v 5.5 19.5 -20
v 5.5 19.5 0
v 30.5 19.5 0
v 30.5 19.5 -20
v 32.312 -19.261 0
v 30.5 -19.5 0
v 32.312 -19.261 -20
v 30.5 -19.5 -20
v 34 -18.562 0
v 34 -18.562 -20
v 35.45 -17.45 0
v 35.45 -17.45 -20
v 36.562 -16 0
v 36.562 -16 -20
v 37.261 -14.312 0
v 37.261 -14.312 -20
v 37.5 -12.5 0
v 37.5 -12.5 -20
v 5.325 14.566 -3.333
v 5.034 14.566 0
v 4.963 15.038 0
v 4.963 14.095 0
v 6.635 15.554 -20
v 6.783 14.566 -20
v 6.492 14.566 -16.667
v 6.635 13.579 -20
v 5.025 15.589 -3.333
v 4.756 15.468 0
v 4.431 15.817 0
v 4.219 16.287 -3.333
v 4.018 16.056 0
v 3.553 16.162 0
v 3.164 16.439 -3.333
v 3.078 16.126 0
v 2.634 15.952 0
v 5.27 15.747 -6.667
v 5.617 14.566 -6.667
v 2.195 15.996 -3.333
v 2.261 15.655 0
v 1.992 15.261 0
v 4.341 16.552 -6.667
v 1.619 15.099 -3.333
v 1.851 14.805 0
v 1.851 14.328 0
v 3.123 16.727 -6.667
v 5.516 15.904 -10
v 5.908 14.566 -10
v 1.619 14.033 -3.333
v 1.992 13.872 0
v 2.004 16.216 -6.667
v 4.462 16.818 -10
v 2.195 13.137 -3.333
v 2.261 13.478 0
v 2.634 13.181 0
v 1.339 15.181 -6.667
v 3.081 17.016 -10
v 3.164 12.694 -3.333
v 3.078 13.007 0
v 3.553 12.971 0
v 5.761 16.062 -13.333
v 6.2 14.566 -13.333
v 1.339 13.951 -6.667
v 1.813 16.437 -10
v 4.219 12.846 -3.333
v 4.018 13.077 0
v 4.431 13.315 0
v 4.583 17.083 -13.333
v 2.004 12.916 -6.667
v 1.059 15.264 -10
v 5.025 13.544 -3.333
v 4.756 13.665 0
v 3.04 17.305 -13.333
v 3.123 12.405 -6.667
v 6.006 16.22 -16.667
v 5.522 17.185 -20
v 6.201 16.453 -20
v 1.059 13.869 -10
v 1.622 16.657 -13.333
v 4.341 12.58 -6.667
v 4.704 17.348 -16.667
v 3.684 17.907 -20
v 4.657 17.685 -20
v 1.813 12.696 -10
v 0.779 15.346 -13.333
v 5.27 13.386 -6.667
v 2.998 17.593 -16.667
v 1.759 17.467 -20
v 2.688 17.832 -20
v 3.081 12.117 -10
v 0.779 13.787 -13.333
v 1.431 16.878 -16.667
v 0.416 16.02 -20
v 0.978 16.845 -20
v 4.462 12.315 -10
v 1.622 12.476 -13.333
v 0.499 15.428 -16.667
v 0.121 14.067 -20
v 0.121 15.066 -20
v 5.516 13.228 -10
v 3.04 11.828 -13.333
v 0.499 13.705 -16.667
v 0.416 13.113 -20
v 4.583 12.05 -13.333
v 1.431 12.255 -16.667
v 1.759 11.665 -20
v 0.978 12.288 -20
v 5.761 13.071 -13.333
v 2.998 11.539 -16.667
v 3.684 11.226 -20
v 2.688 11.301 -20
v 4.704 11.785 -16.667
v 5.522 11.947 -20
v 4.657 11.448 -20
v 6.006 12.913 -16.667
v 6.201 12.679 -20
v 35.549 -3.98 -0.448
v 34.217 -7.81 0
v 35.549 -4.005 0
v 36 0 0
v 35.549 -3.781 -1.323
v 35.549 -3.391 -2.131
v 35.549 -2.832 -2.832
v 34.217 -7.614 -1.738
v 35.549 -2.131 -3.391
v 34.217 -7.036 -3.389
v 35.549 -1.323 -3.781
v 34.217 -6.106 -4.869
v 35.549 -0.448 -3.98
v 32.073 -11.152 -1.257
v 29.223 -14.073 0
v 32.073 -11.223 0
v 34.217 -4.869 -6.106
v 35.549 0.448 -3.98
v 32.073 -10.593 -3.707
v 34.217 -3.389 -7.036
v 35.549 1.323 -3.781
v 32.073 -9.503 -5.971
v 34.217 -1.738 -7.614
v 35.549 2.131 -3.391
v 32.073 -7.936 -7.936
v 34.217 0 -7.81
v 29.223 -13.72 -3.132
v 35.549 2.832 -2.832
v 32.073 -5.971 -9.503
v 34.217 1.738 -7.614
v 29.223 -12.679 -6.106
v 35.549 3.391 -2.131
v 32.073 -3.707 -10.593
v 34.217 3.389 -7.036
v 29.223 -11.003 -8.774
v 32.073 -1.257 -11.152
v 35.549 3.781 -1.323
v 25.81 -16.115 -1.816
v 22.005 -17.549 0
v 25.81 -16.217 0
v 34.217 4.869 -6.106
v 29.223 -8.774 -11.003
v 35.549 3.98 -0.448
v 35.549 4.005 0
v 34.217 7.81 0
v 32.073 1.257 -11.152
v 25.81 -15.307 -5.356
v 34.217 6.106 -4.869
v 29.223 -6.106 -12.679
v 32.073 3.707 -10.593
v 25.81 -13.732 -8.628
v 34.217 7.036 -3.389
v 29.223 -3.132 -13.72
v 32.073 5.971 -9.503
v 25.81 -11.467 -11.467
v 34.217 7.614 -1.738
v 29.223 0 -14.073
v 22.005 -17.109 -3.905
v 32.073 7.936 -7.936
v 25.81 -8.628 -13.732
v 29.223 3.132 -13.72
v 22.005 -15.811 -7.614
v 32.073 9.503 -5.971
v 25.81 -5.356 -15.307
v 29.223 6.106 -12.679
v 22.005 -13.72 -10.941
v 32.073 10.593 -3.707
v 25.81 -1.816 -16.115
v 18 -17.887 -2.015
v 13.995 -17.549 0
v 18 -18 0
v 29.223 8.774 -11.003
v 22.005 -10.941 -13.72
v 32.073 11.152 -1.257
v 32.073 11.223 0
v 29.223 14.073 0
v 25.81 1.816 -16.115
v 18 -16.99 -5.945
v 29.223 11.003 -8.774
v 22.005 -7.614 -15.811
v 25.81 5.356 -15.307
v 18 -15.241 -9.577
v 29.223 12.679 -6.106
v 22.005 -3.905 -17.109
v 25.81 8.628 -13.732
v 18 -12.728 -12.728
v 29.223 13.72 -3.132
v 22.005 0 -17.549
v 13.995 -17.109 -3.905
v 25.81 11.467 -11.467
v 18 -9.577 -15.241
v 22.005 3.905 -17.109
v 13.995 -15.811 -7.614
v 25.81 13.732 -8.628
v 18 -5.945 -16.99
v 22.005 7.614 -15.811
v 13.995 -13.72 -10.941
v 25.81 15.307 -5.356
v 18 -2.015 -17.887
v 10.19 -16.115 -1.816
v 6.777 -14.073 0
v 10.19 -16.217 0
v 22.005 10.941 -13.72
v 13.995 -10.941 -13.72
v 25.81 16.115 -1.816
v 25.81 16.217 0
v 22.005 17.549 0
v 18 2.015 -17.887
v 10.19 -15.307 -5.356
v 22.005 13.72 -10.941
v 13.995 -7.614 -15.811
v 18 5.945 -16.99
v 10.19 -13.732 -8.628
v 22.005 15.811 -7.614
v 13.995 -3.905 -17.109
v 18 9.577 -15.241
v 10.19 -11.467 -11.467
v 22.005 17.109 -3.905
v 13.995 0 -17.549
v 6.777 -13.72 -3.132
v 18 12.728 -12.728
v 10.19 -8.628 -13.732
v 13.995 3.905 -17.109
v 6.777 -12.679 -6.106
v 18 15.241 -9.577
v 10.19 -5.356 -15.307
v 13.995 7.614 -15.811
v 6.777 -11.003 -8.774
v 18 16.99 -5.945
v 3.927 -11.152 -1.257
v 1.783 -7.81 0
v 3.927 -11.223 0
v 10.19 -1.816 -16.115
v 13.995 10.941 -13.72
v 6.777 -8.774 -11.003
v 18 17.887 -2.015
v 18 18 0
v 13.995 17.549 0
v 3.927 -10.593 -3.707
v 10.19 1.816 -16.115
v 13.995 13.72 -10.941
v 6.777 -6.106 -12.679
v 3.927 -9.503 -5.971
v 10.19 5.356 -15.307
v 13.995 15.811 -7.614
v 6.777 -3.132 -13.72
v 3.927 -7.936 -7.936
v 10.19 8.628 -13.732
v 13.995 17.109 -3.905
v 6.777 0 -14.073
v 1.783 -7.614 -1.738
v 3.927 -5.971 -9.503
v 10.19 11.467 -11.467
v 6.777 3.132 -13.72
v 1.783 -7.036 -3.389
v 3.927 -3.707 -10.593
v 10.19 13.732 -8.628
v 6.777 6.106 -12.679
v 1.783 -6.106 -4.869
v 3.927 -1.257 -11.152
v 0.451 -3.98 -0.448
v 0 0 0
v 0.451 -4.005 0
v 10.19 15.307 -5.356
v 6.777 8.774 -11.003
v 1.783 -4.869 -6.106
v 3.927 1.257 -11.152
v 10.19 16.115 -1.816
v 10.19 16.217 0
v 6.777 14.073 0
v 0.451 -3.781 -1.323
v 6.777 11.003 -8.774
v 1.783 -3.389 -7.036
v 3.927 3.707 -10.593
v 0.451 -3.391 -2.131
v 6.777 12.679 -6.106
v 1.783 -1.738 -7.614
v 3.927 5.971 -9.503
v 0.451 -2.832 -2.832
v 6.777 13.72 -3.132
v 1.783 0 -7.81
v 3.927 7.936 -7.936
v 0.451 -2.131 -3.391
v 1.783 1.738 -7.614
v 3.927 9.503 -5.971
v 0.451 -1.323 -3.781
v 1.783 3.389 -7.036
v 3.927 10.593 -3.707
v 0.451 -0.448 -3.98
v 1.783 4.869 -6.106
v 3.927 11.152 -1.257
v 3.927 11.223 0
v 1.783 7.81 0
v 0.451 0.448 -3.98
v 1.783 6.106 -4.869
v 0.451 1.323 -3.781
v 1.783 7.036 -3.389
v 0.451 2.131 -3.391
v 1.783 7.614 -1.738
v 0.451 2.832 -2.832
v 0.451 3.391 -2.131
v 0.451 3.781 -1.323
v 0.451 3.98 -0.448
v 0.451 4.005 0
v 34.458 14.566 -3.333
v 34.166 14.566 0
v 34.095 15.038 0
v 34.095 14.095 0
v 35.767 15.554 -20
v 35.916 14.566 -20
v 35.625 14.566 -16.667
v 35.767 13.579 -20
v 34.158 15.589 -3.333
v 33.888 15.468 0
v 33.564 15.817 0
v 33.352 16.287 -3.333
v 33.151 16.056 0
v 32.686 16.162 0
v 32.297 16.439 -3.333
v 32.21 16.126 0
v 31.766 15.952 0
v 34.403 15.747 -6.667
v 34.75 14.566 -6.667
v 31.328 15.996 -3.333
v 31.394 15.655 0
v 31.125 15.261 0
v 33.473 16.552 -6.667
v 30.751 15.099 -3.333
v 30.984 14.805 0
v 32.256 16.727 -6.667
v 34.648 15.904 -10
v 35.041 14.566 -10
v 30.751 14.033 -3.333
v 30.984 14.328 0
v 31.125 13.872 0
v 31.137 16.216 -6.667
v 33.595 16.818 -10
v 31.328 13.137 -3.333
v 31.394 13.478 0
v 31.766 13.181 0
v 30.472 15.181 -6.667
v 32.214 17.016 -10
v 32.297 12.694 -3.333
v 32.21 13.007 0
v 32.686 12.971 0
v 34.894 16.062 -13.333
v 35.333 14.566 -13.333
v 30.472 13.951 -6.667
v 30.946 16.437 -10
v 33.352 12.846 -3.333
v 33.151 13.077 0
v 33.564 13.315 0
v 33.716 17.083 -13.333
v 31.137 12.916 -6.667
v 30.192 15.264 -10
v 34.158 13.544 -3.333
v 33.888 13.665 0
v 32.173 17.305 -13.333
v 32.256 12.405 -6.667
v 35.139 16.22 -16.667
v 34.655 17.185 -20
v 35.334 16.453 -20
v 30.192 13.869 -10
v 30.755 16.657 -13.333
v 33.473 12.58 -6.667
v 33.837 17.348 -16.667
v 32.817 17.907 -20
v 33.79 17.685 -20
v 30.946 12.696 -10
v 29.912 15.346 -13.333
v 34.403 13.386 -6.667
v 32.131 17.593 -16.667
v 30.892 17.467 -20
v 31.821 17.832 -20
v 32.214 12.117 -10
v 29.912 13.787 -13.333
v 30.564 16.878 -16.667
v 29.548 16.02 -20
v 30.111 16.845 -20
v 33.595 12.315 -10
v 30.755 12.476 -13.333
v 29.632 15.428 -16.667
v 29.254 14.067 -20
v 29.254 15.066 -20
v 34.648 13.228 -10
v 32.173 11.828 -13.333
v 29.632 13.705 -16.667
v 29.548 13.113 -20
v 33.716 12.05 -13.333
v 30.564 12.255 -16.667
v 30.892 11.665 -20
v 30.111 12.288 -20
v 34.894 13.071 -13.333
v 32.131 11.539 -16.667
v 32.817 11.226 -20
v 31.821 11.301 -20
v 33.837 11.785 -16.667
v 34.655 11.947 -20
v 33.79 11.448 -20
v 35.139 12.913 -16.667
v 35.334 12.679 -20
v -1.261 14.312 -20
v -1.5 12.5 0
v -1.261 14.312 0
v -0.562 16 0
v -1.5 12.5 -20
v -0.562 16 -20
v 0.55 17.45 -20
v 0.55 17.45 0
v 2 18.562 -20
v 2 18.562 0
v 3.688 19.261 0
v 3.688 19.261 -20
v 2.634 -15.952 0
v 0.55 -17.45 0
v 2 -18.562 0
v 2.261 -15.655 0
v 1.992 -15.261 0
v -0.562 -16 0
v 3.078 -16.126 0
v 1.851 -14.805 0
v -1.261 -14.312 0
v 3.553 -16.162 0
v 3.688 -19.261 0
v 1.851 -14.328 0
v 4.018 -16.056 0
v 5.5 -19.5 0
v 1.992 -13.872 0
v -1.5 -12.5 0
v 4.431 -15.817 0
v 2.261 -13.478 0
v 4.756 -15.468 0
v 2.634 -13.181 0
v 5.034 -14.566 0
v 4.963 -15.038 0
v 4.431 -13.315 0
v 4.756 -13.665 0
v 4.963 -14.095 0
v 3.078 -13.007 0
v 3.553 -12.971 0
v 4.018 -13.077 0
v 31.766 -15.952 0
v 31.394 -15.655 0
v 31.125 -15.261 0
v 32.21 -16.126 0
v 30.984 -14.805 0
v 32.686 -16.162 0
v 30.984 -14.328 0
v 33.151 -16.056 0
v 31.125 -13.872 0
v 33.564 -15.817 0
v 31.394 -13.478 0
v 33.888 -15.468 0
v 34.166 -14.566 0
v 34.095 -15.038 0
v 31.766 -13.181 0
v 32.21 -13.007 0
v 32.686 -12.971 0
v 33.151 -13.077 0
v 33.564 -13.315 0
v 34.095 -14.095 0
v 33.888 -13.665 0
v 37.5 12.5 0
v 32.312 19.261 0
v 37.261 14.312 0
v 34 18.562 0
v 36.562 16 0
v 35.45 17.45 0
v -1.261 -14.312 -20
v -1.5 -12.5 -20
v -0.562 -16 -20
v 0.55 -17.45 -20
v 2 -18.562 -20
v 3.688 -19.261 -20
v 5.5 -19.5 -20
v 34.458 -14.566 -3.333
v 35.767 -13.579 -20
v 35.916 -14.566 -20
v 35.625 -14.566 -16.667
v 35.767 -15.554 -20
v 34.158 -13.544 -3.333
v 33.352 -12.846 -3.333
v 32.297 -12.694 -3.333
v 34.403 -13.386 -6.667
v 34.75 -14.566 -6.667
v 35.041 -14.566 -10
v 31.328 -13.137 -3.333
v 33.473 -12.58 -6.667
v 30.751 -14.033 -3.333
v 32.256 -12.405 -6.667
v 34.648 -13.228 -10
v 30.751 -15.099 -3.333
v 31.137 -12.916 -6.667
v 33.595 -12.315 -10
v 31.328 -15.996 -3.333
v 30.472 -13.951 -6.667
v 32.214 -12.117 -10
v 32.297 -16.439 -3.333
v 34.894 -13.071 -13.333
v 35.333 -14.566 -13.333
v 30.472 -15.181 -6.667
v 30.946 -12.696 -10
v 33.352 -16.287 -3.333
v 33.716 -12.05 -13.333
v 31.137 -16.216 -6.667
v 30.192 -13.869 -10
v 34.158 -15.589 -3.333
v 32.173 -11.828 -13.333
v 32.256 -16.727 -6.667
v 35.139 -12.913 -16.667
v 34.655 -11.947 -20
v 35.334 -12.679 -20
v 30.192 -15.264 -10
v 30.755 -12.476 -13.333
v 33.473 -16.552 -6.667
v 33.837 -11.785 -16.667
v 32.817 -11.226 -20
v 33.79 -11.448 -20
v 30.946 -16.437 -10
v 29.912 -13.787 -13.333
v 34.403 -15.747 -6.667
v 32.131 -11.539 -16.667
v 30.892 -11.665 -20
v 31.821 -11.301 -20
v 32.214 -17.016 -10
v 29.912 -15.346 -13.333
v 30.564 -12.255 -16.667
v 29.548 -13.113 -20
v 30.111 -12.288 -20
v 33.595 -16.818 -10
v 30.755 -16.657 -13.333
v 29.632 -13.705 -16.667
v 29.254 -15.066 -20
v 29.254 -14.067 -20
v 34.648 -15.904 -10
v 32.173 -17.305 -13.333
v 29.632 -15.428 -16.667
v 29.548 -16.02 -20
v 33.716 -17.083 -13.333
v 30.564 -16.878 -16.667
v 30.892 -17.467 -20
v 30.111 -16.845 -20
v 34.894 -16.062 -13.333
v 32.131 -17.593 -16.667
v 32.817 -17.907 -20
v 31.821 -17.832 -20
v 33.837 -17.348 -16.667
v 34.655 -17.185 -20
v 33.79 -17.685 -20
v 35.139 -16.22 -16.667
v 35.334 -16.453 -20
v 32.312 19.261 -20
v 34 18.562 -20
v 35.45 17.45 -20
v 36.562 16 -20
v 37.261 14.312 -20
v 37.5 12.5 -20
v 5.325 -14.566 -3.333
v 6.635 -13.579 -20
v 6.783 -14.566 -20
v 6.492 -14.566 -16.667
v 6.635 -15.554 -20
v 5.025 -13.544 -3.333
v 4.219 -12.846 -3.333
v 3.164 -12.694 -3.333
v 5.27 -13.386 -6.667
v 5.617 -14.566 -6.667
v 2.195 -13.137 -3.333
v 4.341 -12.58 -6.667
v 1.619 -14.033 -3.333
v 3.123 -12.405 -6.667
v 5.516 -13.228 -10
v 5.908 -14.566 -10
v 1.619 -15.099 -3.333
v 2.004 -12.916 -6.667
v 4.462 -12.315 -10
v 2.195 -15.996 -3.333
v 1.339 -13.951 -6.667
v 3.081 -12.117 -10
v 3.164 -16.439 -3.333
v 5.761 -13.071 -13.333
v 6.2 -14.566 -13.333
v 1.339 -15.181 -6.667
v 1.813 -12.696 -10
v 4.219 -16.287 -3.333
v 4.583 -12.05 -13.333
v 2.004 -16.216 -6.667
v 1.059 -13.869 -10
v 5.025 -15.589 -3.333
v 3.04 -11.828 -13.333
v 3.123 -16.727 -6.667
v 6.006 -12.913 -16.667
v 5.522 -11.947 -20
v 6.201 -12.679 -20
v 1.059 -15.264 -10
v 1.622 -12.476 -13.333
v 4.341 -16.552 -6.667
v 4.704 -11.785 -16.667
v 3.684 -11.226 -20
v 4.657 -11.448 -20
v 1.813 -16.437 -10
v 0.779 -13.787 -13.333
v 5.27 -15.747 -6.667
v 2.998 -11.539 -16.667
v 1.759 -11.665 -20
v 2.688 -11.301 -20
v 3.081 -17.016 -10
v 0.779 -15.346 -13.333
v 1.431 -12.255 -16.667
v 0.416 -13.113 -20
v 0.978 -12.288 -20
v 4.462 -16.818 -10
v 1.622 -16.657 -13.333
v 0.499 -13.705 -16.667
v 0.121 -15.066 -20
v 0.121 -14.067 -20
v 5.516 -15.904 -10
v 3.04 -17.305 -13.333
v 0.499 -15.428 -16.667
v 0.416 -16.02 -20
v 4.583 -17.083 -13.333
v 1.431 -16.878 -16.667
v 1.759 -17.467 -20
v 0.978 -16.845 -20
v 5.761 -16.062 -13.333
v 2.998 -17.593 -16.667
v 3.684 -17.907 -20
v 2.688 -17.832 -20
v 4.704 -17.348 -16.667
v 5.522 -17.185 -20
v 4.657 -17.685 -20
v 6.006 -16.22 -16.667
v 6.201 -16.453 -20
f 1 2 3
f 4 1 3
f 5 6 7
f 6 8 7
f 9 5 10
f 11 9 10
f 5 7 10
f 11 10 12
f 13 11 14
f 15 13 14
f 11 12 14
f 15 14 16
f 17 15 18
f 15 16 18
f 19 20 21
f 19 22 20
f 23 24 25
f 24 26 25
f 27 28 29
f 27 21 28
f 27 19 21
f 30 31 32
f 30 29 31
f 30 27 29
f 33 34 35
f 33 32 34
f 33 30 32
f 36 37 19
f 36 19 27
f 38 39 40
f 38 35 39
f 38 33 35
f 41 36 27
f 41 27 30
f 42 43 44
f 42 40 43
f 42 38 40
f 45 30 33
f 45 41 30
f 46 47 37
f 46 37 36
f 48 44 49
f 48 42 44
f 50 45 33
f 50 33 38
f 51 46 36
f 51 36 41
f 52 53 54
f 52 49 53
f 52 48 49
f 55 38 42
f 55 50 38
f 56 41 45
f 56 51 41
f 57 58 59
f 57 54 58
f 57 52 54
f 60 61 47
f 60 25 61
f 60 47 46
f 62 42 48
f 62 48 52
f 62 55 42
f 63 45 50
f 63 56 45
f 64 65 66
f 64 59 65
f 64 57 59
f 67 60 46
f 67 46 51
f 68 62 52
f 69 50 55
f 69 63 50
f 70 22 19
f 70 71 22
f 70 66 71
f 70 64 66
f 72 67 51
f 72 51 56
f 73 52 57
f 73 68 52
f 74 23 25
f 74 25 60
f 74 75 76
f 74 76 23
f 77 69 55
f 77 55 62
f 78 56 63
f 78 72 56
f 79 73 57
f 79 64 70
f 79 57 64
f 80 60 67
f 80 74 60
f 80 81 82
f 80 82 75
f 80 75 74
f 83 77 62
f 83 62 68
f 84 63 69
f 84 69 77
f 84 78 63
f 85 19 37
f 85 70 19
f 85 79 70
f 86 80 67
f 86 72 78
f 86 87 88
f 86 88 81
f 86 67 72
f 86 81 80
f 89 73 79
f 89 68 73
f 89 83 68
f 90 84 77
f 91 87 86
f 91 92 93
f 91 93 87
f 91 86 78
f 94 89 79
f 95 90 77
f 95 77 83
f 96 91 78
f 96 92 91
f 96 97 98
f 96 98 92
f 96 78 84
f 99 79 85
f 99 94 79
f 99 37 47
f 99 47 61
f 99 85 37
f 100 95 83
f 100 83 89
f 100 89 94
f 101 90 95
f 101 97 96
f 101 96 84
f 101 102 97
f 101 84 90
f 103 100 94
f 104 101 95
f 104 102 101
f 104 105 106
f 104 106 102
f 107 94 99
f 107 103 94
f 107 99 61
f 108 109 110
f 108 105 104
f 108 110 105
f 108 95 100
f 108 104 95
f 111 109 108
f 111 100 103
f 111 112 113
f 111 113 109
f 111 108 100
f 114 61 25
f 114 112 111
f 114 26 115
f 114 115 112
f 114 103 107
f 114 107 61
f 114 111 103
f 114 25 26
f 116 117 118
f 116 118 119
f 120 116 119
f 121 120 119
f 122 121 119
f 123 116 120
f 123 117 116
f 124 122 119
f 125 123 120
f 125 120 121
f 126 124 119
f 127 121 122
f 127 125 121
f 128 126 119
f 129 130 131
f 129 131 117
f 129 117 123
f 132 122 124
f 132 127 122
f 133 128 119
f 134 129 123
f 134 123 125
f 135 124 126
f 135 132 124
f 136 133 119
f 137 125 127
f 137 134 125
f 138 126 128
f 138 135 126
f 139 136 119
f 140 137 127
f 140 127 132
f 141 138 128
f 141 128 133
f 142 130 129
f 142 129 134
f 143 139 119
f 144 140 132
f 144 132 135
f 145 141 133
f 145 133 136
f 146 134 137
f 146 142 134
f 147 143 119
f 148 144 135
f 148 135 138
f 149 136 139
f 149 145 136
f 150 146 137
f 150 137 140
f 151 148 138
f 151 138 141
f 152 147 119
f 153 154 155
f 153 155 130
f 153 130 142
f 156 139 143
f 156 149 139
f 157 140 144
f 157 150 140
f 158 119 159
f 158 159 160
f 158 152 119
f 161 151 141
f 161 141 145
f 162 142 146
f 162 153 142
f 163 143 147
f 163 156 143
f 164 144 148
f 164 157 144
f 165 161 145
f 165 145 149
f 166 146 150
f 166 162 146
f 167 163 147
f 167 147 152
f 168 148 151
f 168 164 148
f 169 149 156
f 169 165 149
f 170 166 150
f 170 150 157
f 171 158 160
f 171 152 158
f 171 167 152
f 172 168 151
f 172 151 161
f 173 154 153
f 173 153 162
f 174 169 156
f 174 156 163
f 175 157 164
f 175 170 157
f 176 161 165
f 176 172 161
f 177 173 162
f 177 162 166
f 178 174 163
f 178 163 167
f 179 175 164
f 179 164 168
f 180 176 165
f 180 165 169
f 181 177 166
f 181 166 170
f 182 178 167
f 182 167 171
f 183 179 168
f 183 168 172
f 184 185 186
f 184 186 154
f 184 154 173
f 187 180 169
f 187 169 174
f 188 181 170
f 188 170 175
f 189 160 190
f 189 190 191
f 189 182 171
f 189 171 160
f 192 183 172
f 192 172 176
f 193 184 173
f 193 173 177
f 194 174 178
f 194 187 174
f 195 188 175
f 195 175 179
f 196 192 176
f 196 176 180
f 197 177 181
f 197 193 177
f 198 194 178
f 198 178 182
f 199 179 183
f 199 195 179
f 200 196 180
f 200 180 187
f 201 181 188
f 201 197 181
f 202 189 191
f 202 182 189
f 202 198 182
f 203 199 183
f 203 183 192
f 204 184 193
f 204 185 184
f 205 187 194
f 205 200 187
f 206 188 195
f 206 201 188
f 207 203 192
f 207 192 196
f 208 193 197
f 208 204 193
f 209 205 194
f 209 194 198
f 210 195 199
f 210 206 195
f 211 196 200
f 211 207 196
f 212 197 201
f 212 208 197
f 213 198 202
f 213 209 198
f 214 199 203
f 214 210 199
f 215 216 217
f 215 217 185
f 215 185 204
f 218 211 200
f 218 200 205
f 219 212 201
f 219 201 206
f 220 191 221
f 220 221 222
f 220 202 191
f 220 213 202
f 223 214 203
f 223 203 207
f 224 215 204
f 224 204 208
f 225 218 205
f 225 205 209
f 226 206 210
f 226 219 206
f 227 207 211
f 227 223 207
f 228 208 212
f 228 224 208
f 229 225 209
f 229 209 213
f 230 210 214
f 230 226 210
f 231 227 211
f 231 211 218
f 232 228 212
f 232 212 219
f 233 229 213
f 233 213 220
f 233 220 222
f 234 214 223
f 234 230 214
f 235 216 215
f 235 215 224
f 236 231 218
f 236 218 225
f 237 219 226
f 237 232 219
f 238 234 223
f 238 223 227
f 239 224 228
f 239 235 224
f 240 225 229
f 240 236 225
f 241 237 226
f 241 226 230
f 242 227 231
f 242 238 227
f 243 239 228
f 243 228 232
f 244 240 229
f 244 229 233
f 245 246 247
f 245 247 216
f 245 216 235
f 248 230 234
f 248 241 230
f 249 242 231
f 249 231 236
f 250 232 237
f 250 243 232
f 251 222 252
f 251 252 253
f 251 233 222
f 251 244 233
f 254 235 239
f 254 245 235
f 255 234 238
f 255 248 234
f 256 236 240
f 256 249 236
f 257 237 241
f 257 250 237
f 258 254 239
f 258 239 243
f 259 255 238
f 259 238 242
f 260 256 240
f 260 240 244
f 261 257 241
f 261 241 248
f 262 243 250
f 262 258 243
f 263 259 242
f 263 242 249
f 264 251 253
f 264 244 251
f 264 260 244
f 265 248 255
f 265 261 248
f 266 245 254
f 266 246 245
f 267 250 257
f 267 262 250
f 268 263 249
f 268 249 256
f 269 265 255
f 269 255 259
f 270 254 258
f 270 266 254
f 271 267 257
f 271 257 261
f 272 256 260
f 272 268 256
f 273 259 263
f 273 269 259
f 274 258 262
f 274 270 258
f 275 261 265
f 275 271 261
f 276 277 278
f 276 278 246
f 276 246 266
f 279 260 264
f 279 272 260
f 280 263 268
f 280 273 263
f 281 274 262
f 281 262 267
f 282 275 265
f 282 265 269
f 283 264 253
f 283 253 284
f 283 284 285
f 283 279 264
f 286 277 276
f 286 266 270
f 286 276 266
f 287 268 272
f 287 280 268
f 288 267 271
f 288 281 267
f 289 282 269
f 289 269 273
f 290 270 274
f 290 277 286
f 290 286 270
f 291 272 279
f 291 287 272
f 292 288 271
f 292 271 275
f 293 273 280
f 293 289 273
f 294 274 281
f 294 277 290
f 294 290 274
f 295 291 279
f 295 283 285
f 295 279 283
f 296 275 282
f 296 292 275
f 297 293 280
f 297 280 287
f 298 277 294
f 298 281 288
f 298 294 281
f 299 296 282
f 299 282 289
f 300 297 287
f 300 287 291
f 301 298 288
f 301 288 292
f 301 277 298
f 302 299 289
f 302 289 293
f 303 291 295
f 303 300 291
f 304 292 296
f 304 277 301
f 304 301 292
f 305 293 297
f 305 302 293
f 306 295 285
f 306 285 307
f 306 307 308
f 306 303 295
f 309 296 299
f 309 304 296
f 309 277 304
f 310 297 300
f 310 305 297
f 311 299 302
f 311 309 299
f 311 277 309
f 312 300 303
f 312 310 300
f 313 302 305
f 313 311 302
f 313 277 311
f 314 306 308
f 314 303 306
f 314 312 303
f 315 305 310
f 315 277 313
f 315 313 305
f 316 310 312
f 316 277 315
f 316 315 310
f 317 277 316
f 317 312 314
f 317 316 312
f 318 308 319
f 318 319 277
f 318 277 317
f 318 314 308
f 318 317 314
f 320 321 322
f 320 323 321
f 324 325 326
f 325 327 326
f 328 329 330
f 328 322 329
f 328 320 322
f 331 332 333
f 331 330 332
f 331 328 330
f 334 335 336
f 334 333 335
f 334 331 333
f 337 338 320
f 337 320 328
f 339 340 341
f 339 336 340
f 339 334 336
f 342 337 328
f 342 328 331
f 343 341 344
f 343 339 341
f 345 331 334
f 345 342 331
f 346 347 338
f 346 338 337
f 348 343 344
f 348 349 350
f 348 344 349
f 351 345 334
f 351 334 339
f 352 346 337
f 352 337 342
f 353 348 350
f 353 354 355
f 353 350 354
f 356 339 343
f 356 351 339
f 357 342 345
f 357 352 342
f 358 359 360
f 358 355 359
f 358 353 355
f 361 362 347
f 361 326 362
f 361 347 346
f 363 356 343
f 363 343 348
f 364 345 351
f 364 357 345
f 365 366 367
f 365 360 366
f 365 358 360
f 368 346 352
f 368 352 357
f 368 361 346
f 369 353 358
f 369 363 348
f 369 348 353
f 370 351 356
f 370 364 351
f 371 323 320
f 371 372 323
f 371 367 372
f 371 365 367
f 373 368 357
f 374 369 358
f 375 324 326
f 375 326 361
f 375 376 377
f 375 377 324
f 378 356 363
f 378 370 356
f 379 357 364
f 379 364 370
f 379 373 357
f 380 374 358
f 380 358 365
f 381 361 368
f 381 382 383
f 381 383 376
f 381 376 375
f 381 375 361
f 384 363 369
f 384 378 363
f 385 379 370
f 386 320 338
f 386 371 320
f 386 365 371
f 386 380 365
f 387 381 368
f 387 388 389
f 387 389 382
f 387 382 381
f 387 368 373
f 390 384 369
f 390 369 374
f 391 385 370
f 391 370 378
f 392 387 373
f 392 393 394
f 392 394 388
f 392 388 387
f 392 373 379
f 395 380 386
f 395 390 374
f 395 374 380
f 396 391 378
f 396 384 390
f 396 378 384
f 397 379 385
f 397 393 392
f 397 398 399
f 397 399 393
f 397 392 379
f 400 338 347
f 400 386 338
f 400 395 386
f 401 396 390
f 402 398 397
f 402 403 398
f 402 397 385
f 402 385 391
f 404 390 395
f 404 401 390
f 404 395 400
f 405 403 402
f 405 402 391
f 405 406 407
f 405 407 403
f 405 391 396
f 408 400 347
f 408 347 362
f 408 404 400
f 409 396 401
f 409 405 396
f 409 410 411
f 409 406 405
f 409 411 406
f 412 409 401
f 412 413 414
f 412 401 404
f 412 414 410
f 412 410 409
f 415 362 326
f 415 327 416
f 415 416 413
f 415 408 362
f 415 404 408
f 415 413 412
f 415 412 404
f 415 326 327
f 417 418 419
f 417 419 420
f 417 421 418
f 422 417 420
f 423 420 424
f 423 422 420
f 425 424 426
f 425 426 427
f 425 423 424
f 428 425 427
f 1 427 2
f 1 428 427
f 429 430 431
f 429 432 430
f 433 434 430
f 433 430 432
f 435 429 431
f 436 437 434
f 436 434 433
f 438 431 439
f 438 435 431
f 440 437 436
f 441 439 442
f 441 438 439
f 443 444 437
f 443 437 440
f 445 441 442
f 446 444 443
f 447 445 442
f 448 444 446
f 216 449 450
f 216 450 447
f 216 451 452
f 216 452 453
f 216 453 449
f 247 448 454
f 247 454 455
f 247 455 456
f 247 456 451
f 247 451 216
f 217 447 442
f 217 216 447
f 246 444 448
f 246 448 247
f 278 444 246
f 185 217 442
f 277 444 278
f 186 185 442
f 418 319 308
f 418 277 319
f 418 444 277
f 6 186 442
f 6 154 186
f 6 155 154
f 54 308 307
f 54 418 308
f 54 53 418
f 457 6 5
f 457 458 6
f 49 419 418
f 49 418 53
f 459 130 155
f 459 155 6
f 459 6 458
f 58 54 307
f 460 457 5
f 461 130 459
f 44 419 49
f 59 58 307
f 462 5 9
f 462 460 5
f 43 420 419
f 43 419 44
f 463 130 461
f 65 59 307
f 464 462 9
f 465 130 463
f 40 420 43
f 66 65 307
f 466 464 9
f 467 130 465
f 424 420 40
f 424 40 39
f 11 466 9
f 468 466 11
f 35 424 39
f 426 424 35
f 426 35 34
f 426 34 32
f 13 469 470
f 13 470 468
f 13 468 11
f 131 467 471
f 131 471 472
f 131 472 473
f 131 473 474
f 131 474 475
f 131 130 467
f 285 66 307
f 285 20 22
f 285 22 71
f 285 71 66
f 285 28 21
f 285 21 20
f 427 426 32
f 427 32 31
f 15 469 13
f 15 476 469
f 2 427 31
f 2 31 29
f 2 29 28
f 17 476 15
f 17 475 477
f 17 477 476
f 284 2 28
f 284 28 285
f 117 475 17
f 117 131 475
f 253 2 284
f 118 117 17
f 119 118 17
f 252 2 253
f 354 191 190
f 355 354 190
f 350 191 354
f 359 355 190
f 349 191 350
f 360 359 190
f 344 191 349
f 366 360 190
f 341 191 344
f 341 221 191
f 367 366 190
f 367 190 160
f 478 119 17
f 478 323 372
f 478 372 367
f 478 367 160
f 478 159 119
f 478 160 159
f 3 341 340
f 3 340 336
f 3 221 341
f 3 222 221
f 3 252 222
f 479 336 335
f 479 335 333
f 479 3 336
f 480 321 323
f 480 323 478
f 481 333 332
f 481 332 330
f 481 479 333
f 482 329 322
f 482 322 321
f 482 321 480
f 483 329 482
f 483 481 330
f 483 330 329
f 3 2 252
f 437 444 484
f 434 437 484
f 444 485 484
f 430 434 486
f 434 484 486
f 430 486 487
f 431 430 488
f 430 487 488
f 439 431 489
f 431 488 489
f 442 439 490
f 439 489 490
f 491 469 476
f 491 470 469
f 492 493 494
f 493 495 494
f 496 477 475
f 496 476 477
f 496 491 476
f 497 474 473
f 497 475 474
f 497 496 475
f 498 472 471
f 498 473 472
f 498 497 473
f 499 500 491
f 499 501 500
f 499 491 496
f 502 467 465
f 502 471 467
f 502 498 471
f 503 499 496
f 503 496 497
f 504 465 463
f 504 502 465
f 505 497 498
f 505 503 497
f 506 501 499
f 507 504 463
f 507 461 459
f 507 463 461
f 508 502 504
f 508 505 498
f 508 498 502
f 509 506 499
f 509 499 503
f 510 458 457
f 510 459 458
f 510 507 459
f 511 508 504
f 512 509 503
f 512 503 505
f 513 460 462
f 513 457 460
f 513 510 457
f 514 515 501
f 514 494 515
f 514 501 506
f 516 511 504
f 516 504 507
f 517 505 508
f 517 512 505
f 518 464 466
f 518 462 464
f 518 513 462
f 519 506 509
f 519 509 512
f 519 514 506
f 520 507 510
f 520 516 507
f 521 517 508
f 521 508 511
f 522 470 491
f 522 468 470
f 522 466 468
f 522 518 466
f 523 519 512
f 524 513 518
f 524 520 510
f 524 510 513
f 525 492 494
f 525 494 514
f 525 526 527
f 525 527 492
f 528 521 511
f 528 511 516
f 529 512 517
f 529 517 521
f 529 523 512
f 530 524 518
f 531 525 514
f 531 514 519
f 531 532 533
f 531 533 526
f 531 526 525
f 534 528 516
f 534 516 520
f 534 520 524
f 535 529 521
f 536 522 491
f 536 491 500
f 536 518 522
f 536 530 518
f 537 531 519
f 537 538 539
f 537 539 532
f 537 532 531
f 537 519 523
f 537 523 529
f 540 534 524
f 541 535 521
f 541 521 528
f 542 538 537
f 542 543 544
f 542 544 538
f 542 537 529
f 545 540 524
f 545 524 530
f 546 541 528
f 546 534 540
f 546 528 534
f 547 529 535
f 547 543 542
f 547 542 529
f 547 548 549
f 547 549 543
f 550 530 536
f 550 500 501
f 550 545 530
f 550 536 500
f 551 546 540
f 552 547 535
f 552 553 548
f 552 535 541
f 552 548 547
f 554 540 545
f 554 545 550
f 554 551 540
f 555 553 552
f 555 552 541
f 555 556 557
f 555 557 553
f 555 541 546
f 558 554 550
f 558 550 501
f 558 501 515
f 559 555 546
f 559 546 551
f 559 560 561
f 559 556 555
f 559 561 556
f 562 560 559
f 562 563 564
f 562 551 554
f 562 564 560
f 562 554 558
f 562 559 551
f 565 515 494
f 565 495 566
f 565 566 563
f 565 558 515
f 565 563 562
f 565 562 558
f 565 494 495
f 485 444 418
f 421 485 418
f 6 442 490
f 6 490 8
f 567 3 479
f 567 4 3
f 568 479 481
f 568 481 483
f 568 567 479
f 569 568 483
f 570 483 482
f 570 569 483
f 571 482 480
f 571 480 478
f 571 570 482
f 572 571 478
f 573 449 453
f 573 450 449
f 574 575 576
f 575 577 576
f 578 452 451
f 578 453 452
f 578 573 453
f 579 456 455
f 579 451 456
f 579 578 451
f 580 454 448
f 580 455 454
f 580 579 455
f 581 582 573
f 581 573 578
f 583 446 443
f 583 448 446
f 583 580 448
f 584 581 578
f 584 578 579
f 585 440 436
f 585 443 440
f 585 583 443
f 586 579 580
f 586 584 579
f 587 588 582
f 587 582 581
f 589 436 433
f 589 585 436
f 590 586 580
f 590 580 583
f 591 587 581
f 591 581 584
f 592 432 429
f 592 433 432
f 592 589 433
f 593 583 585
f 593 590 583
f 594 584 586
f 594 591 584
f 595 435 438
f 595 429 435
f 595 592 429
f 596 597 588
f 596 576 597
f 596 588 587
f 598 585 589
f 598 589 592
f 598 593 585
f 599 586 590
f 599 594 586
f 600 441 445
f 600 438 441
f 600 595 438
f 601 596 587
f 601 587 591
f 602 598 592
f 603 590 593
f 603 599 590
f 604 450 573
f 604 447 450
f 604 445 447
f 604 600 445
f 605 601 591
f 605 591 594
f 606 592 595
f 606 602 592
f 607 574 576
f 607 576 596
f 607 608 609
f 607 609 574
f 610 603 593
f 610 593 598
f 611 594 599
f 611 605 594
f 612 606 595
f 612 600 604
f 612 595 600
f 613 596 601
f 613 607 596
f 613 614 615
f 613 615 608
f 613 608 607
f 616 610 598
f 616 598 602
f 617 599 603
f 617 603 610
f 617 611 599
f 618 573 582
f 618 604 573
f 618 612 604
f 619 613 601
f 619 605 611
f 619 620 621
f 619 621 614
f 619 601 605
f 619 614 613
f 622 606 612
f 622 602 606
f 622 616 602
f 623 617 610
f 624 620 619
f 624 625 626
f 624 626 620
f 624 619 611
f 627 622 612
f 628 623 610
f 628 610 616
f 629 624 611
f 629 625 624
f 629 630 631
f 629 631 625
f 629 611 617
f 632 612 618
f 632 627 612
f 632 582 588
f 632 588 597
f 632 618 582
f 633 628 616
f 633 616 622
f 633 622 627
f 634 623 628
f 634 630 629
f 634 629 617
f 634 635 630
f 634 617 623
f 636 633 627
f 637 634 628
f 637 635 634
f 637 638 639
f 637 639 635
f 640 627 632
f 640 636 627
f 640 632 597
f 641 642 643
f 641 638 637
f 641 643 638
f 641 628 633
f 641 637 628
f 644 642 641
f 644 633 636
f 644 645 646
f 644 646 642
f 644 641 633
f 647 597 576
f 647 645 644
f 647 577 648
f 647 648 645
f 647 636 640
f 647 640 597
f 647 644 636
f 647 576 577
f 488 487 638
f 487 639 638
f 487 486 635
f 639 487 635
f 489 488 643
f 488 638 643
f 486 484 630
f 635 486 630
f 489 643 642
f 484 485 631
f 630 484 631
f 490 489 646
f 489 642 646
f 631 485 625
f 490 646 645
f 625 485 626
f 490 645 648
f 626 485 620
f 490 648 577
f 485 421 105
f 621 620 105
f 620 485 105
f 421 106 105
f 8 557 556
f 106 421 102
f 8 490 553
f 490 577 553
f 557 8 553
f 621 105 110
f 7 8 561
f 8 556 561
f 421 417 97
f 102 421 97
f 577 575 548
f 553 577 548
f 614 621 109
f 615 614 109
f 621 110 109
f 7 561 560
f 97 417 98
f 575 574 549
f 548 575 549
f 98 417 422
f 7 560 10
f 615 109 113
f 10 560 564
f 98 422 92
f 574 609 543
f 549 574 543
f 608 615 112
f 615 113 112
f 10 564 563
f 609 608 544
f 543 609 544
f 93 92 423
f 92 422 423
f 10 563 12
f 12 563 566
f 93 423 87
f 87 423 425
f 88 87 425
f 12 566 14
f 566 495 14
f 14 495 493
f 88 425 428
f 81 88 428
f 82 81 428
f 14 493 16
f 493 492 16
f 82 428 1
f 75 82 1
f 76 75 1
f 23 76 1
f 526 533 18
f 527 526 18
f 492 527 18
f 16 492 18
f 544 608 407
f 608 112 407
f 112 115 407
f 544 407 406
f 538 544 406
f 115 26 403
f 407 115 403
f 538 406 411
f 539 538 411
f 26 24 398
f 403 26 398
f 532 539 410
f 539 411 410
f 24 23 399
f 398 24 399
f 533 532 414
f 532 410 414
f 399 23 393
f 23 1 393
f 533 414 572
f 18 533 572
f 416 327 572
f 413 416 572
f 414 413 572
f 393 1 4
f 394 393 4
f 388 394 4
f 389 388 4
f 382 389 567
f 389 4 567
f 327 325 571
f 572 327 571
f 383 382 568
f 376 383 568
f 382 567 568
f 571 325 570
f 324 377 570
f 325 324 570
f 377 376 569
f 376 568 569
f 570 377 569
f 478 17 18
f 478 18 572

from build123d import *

# Parameters (mm, degrees)
F2_W     = 39
F2_H     = 39
F3_DEPTH = 20
F5_R     = 7
F6_R     = 1.6
F7_DEPTH = 20.001
F7_TAPER = -5


with BuildPart() as f1:
    # F0 (on Top) → F1 (revolve)
    with BuildSketch(Plane.XY):
        with BuildLine():
            Line((0, 0), (36, 0))
            ThreePointArc((36, 0), (18, 18), (0, 0))
        make_face()
    revolve(axis=Axis((18, 0, 0), (1, 0, 0)))


with BuildPart() as f3:
    # F2 (on Top) → F3 (new body)
    with BuildSketch(Plane.XY):
        with Locations((18, 0)):
            Rectangle(F2_W, F2_H)
    extrude(amount=-F3_DEPTH)

    # F4: cut F1
    add(f1.part, mode=Mode.SUBTRACT)

    # F5
    f5_edges = [f3.edges().sort_by_distance(p)[0] for p in [
        (-1.5, -19.5, -10),
        (37.5, -19.5, -10),
        (37.5, 19.5, -10),
        (-1.5, 19.5, -10),
    ]]
    fillet(f5_edges, radius=F5_R)

    # F6 (on face) → F7 (cut, through all)
    with BuildSketch(Plane.XY):
        with Locations((32.5663996924, 14.5663996924)):
            Circle(F6_R)
        with Locations((3.4336003076, 14.5663996924)):
            Circle(F6_R)
        with Locations((3.4336003076, -14.5663996924)):
            Circle(F6_R)
        with Locations((32.5663996924, -14.5663996924)):
            Circle(F6_R)
    extrude(amount=-F7_DEPTH, taper=F7_TAPER, mode=Mode.SUBTRACT)


solid = f3.part
